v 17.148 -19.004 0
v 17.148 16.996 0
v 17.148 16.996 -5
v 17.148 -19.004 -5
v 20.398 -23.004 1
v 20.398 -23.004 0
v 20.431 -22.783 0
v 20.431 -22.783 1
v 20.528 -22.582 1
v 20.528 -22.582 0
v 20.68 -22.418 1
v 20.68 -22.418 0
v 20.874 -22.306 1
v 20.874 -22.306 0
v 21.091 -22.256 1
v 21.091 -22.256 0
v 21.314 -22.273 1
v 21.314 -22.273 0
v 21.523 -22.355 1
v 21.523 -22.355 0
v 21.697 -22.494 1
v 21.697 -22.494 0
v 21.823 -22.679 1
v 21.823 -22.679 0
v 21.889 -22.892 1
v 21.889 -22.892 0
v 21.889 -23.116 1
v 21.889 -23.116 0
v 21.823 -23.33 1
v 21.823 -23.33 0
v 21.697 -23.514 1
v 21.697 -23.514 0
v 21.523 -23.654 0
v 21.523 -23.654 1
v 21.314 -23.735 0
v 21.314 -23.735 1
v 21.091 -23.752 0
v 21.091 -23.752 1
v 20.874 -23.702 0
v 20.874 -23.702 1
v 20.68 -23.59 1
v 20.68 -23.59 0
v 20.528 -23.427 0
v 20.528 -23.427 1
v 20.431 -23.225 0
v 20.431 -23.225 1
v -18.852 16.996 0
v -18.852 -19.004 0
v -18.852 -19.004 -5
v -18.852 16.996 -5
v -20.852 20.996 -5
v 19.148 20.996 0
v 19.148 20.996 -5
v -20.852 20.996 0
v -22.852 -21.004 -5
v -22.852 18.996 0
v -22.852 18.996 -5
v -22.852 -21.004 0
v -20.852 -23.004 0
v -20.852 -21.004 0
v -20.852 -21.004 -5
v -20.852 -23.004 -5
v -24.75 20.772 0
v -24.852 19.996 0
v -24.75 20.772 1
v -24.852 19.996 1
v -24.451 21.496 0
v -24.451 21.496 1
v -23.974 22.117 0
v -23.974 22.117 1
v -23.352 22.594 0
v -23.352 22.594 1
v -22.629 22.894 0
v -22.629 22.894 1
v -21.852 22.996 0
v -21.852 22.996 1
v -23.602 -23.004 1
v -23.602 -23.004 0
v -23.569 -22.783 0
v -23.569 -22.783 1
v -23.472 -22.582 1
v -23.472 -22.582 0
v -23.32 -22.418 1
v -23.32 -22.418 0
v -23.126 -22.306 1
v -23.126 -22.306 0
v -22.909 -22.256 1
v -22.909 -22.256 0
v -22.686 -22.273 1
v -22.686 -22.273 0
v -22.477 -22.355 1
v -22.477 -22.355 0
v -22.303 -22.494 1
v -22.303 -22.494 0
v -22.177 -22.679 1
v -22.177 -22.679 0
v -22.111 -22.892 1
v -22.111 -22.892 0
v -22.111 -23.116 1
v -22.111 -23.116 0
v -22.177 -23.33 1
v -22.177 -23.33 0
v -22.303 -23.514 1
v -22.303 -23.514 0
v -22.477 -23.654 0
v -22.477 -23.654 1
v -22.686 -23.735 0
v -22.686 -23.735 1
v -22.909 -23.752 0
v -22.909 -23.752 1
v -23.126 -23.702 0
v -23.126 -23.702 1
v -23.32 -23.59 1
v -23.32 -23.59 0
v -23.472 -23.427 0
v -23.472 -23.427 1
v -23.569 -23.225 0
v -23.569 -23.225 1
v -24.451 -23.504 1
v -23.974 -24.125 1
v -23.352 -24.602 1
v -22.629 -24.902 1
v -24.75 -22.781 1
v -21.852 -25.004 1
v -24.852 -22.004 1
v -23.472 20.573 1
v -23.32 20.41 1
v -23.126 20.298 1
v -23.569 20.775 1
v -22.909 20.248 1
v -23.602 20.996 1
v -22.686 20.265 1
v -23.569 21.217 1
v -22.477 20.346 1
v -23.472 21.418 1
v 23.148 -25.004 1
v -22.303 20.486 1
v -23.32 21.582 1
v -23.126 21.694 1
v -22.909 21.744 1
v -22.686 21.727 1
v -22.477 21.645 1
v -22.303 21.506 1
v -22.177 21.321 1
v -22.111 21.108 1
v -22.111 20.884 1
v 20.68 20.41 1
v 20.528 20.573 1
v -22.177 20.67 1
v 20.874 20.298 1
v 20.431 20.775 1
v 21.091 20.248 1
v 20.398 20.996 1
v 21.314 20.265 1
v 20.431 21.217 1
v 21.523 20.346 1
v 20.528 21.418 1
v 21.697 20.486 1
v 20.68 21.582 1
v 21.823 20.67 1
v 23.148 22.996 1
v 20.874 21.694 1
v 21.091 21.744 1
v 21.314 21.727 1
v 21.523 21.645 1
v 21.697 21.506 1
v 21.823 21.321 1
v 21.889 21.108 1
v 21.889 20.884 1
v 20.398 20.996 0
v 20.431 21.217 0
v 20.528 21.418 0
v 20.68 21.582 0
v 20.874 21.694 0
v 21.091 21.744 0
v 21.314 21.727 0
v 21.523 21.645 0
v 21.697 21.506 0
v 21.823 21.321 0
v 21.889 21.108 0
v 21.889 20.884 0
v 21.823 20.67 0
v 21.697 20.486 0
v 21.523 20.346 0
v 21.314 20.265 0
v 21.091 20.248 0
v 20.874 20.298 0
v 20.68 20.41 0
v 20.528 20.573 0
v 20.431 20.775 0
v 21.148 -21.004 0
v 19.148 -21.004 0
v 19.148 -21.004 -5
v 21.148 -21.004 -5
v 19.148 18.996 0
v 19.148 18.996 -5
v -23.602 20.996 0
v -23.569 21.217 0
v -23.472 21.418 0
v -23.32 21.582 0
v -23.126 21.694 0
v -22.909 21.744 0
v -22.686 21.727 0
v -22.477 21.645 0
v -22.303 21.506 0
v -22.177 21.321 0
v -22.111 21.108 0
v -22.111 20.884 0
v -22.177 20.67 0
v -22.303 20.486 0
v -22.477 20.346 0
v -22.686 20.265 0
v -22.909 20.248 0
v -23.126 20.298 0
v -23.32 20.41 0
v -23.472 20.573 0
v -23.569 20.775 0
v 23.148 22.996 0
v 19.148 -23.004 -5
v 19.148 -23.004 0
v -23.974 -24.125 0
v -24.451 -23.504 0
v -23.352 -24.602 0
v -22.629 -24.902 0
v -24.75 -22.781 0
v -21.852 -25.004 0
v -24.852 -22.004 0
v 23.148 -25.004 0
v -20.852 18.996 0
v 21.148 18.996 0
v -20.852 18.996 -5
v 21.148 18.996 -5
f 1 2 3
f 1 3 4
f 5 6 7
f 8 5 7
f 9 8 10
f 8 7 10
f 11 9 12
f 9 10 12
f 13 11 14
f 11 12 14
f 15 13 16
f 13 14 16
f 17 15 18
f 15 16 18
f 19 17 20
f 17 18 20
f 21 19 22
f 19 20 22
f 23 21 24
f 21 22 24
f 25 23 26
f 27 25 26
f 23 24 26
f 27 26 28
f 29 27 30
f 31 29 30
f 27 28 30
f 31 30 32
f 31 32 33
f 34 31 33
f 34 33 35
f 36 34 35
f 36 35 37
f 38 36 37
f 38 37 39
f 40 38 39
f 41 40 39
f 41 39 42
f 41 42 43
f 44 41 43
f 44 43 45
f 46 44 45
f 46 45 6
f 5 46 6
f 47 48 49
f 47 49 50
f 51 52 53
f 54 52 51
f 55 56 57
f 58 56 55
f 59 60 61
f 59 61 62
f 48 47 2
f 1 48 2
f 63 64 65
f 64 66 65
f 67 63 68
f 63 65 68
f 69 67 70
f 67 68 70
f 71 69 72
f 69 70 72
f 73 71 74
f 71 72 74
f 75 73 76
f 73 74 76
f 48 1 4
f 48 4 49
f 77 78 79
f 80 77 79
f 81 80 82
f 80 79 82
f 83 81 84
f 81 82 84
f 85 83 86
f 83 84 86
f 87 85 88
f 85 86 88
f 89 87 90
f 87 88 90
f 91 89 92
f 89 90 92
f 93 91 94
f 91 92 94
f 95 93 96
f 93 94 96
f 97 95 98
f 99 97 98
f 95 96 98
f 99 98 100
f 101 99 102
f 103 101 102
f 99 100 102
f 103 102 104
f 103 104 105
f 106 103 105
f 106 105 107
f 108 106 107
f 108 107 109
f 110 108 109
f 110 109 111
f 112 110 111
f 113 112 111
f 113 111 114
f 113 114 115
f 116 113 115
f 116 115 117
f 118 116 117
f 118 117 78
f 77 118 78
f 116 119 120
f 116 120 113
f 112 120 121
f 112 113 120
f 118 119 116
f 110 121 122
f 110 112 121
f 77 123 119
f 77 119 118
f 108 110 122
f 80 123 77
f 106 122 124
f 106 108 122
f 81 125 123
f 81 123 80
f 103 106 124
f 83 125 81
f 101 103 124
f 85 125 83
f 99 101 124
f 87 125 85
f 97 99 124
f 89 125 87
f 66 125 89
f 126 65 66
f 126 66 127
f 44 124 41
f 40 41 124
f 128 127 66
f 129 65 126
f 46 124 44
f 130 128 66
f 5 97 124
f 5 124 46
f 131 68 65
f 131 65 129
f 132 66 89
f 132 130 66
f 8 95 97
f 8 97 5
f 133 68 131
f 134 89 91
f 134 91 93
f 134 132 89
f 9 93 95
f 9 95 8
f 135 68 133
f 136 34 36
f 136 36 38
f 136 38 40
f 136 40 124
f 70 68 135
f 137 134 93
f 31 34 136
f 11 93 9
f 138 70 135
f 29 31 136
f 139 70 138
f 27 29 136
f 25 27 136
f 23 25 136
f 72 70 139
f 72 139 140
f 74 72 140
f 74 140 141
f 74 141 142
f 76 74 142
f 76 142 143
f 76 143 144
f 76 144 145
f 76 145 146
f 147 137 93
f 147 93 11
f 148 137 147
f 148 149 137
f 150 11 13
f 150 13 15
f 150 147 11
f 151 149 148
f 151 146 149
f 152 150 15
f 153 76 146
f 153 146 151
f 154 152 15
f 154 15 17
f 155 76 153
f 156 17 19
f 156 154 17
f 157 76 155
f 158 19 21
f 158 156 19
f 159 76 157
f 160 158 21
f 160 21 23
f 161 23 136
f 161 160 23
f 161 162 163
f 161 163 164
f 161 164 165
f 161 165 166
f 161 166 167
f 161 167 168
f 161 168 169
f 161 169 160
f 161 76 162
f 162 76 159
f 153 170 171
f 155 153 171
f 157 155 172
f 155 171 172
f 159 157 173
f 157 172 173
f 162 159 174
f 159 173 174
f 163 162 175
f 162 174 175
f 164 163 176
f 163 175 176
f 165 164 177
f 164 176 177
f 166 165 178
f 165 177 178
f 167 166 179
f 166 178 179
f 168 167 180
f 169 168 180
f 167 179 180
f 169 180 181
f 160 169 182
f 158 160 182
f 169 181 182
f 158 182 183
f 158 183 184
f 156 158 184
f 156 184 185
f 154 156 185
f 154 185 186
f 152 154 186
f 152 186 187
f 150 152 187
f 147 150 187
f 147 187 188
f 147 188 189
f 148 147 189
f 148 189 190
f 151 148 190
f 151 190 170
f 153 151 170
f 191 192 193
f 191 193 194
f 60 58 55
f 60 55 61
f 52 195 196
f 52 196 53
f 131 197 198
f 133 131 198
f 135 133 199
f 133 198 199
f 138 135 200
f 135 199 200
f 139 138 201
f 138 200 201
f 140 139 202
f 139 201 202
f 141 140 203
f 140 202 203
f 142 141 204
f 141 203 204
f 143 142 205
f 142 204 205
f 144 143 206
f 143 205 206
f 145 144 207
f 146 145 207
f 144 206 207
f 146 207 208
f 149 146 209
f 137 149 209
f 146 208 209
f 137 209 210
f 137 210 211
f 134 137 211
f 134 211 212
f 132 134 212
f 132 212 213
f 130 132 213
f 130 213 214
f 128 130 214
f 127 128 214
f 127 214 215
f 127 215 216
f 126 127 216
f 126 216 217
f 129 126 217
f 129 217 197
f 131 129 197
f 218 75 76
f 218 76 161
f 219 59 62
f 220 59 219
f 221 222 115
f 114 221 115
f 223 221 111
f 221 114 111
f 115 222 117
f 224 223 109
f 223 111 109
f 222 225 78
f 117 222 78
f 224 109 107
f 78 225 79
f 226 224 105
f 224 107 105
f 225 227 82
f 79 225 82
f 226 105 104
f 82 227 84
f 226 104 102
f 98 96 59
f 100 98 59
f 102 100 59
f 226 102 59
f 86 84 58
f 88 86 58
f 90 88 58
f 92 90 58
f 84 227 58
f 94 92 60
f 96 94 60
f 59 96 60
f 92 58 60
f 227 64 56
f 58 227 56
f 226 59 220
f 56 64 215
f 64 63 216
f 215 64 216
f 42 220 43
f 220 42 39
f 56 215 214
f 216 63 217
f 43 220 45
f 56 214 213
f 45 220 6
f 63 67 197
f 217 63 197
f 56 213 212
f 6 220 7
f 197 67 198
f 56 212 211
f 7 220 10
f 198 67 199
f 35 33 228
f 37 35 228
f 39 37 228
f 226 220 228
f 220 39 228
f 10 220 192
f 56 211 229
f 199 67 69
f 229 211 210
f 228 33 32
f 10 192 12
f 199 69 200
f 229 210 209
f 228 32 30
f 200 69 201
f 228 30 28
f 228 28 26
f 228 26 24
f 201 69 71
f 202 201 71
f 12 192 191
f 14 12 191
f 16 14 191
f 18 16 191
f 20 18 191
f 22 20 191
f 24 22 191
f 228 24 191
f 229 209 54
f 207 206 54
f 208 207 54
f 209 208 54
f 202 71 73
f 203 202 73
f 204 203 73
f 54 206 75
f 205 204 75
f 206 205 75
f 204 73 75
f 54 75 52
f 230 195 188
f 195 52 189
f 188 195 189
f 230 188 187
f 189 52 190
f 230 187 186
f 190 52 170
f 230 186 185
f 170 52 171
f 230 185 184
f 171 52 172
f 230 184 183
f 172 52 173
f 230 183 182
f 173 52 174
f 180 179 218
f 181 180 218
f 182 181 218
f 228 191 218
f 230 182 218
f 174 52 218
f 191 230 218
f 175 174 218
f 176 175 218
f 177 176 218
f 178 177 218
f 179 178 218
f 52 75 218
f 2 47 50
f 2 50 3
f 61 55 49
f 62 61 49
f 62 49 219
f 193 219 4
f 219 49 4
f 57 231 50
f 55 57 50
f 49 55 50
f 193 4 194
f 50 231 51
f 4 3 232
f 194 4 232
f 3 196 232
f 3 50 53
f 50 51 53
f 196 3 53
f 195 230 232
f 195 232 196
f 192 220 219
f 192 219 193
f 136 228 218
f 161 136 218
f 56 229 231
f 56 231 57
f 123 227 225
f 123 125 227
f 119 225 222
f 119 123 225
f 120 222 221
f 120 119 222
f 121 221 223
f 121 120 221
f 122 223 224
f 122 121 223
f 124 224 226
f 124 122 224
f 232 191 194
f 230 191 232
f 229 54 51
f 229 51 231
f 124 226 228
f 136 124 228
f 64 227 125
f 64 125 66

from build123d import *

# Parameters (mm, degrees)
F0_W     = 48
F0_H     = 48
F1_DEPTH = 1
F2_W     = 2
F2_H     = 2
F3_DEPTH = 5
F5_D     = 1.5
F6_R     = 3


with BuildPart() as f1:
    # F0 (on Top) → F1 (new body)
    with BuildSketch(Plane.XY):
        with Locations((-0.8524587825, -1.0040983325)):
            Rectangle(F0_W, F0_H)
        Polygon((19.1475412175, 18.9959016675), (21.1475412175, 18.9959016675), (21.1475412175, -21.0040983325), (19.1475412175, -21.0040983325), (19.1475412175, -23.0040983325), (-20.8524587825, -23.0040983325), (-20.8524587825, -21.0040983325), (-22.8524587825, -21.0040983325), (-22.8524587825, 18.9959016675), (-20.8524587825, 18.9959016675), (-20.8524587825, 20.9959016675), (19.1475412175, 20.9959016675), align=None, mode=Mode.SUBTRACT)
        Polygon((21.1475412175, -21.0040983325), (21.1475412175, 18.9959016675), (19.1475412175, 18.9959016675), (19.1475412175, 20.9959016675), (-20.8524587825, 20.9959016675), (-20.8524587825, 18.9959016675), (-22.8524587825, 18.9959016675), (-22.8524587825, -21.0040983325), (-20.8524587825, -21.0040983325), (-20.8524587825, -23.0040983325), (19.1475412175, -23.0040983325), (19.1475412175, -21.0040983325), align=None)
    extrude(amount=F1_DEPTH)

    # F2 (on Top) → F3 (join)
    with BuildSketch(Plane.XY):
        Polygon((-20.8524587825, -21.0040983325), (-20.8524587825, -23.0040983325), (19.1475412175, -23.0040983325), (19.1475412175, -21.0040983325), (17.1475412175, -21.0040983325), (17.1475412175, -19.0040983325), (-18.8524587825, -19.0040983325), (-18.8524587825, -21.0040983325), align=None)
        Polygon((-22.8524587825, -21.0040983325), (-20.8524587825, -21.0040983325), (-20.8524587825, -19.0040983325), (-18.8524587825, -19.0040983325), (-18.8524587825, 16.9959016675), (-20.8524587825, 16.9959016675), (-20.8524587825, 18.9959016675), (-22.8524587825, 18.9959016675), align=None)
        with Locations((-19.8524587825, -20.0040983325)):
            Rectangle(F2_W, F2_H)
        with Locations((18.1475412175, -20.0040983325)):
            Rectangle(F2_W, F2_H)
        Polygon((19.1475412175, -19.0040983325), (19.1475412175, -21.0040983325), (21.1475412175, -21.0040983325), (21.1475412175, 18.9959016675), (19.1475412175, 18.9959016675), (19.1475412175, 16.9959016675), (17.1475412175, 16.9959016675), (17.1475412175, -19.0040983325), align=None)
        with Locations((-19.8524587825, 17.9959016675)):
            Rectangle(F2_W, F2_H)
        Polygon((-18.8524587825, 18.9959016675), (-18.8524587825, 16.9959016675), (17.1475412175, 16.9959016675), (17.1475412175, 18.9959016675), (19.1475412175, 18.9959016675), (19.1475412175, 20.9959016675), (-20.8524587825, 20.9959016675), (-20.8524587825, 18.9959016675), align=None)
        with Locations((18.1475412175, 17.9959016675)):
            Rectangle(F2_W, F2_H)
    extrude(amount=-F3_DEPTH)

    # F5 (through all)
    with Locations(Plane.XY.offset(1)):
        with Locations((-22.8524587825, 20.9959016675), (-22.8524587825, -23.0040983325), (21.1475412175, -23.0040983325), (21.1475412175, 20.9959016675)):
            Hole(F5_D / 2)

    # F6
    f6_edges = [f1.edges().sort_by_distance(p)[0] for p in [
        (-24.852459, -25.004098, 0.5),
        (-24.852459, 22.995902, 0.5),
    ]]
    fillet(f6_edges, radius=F6_R)


solid = f1.part
